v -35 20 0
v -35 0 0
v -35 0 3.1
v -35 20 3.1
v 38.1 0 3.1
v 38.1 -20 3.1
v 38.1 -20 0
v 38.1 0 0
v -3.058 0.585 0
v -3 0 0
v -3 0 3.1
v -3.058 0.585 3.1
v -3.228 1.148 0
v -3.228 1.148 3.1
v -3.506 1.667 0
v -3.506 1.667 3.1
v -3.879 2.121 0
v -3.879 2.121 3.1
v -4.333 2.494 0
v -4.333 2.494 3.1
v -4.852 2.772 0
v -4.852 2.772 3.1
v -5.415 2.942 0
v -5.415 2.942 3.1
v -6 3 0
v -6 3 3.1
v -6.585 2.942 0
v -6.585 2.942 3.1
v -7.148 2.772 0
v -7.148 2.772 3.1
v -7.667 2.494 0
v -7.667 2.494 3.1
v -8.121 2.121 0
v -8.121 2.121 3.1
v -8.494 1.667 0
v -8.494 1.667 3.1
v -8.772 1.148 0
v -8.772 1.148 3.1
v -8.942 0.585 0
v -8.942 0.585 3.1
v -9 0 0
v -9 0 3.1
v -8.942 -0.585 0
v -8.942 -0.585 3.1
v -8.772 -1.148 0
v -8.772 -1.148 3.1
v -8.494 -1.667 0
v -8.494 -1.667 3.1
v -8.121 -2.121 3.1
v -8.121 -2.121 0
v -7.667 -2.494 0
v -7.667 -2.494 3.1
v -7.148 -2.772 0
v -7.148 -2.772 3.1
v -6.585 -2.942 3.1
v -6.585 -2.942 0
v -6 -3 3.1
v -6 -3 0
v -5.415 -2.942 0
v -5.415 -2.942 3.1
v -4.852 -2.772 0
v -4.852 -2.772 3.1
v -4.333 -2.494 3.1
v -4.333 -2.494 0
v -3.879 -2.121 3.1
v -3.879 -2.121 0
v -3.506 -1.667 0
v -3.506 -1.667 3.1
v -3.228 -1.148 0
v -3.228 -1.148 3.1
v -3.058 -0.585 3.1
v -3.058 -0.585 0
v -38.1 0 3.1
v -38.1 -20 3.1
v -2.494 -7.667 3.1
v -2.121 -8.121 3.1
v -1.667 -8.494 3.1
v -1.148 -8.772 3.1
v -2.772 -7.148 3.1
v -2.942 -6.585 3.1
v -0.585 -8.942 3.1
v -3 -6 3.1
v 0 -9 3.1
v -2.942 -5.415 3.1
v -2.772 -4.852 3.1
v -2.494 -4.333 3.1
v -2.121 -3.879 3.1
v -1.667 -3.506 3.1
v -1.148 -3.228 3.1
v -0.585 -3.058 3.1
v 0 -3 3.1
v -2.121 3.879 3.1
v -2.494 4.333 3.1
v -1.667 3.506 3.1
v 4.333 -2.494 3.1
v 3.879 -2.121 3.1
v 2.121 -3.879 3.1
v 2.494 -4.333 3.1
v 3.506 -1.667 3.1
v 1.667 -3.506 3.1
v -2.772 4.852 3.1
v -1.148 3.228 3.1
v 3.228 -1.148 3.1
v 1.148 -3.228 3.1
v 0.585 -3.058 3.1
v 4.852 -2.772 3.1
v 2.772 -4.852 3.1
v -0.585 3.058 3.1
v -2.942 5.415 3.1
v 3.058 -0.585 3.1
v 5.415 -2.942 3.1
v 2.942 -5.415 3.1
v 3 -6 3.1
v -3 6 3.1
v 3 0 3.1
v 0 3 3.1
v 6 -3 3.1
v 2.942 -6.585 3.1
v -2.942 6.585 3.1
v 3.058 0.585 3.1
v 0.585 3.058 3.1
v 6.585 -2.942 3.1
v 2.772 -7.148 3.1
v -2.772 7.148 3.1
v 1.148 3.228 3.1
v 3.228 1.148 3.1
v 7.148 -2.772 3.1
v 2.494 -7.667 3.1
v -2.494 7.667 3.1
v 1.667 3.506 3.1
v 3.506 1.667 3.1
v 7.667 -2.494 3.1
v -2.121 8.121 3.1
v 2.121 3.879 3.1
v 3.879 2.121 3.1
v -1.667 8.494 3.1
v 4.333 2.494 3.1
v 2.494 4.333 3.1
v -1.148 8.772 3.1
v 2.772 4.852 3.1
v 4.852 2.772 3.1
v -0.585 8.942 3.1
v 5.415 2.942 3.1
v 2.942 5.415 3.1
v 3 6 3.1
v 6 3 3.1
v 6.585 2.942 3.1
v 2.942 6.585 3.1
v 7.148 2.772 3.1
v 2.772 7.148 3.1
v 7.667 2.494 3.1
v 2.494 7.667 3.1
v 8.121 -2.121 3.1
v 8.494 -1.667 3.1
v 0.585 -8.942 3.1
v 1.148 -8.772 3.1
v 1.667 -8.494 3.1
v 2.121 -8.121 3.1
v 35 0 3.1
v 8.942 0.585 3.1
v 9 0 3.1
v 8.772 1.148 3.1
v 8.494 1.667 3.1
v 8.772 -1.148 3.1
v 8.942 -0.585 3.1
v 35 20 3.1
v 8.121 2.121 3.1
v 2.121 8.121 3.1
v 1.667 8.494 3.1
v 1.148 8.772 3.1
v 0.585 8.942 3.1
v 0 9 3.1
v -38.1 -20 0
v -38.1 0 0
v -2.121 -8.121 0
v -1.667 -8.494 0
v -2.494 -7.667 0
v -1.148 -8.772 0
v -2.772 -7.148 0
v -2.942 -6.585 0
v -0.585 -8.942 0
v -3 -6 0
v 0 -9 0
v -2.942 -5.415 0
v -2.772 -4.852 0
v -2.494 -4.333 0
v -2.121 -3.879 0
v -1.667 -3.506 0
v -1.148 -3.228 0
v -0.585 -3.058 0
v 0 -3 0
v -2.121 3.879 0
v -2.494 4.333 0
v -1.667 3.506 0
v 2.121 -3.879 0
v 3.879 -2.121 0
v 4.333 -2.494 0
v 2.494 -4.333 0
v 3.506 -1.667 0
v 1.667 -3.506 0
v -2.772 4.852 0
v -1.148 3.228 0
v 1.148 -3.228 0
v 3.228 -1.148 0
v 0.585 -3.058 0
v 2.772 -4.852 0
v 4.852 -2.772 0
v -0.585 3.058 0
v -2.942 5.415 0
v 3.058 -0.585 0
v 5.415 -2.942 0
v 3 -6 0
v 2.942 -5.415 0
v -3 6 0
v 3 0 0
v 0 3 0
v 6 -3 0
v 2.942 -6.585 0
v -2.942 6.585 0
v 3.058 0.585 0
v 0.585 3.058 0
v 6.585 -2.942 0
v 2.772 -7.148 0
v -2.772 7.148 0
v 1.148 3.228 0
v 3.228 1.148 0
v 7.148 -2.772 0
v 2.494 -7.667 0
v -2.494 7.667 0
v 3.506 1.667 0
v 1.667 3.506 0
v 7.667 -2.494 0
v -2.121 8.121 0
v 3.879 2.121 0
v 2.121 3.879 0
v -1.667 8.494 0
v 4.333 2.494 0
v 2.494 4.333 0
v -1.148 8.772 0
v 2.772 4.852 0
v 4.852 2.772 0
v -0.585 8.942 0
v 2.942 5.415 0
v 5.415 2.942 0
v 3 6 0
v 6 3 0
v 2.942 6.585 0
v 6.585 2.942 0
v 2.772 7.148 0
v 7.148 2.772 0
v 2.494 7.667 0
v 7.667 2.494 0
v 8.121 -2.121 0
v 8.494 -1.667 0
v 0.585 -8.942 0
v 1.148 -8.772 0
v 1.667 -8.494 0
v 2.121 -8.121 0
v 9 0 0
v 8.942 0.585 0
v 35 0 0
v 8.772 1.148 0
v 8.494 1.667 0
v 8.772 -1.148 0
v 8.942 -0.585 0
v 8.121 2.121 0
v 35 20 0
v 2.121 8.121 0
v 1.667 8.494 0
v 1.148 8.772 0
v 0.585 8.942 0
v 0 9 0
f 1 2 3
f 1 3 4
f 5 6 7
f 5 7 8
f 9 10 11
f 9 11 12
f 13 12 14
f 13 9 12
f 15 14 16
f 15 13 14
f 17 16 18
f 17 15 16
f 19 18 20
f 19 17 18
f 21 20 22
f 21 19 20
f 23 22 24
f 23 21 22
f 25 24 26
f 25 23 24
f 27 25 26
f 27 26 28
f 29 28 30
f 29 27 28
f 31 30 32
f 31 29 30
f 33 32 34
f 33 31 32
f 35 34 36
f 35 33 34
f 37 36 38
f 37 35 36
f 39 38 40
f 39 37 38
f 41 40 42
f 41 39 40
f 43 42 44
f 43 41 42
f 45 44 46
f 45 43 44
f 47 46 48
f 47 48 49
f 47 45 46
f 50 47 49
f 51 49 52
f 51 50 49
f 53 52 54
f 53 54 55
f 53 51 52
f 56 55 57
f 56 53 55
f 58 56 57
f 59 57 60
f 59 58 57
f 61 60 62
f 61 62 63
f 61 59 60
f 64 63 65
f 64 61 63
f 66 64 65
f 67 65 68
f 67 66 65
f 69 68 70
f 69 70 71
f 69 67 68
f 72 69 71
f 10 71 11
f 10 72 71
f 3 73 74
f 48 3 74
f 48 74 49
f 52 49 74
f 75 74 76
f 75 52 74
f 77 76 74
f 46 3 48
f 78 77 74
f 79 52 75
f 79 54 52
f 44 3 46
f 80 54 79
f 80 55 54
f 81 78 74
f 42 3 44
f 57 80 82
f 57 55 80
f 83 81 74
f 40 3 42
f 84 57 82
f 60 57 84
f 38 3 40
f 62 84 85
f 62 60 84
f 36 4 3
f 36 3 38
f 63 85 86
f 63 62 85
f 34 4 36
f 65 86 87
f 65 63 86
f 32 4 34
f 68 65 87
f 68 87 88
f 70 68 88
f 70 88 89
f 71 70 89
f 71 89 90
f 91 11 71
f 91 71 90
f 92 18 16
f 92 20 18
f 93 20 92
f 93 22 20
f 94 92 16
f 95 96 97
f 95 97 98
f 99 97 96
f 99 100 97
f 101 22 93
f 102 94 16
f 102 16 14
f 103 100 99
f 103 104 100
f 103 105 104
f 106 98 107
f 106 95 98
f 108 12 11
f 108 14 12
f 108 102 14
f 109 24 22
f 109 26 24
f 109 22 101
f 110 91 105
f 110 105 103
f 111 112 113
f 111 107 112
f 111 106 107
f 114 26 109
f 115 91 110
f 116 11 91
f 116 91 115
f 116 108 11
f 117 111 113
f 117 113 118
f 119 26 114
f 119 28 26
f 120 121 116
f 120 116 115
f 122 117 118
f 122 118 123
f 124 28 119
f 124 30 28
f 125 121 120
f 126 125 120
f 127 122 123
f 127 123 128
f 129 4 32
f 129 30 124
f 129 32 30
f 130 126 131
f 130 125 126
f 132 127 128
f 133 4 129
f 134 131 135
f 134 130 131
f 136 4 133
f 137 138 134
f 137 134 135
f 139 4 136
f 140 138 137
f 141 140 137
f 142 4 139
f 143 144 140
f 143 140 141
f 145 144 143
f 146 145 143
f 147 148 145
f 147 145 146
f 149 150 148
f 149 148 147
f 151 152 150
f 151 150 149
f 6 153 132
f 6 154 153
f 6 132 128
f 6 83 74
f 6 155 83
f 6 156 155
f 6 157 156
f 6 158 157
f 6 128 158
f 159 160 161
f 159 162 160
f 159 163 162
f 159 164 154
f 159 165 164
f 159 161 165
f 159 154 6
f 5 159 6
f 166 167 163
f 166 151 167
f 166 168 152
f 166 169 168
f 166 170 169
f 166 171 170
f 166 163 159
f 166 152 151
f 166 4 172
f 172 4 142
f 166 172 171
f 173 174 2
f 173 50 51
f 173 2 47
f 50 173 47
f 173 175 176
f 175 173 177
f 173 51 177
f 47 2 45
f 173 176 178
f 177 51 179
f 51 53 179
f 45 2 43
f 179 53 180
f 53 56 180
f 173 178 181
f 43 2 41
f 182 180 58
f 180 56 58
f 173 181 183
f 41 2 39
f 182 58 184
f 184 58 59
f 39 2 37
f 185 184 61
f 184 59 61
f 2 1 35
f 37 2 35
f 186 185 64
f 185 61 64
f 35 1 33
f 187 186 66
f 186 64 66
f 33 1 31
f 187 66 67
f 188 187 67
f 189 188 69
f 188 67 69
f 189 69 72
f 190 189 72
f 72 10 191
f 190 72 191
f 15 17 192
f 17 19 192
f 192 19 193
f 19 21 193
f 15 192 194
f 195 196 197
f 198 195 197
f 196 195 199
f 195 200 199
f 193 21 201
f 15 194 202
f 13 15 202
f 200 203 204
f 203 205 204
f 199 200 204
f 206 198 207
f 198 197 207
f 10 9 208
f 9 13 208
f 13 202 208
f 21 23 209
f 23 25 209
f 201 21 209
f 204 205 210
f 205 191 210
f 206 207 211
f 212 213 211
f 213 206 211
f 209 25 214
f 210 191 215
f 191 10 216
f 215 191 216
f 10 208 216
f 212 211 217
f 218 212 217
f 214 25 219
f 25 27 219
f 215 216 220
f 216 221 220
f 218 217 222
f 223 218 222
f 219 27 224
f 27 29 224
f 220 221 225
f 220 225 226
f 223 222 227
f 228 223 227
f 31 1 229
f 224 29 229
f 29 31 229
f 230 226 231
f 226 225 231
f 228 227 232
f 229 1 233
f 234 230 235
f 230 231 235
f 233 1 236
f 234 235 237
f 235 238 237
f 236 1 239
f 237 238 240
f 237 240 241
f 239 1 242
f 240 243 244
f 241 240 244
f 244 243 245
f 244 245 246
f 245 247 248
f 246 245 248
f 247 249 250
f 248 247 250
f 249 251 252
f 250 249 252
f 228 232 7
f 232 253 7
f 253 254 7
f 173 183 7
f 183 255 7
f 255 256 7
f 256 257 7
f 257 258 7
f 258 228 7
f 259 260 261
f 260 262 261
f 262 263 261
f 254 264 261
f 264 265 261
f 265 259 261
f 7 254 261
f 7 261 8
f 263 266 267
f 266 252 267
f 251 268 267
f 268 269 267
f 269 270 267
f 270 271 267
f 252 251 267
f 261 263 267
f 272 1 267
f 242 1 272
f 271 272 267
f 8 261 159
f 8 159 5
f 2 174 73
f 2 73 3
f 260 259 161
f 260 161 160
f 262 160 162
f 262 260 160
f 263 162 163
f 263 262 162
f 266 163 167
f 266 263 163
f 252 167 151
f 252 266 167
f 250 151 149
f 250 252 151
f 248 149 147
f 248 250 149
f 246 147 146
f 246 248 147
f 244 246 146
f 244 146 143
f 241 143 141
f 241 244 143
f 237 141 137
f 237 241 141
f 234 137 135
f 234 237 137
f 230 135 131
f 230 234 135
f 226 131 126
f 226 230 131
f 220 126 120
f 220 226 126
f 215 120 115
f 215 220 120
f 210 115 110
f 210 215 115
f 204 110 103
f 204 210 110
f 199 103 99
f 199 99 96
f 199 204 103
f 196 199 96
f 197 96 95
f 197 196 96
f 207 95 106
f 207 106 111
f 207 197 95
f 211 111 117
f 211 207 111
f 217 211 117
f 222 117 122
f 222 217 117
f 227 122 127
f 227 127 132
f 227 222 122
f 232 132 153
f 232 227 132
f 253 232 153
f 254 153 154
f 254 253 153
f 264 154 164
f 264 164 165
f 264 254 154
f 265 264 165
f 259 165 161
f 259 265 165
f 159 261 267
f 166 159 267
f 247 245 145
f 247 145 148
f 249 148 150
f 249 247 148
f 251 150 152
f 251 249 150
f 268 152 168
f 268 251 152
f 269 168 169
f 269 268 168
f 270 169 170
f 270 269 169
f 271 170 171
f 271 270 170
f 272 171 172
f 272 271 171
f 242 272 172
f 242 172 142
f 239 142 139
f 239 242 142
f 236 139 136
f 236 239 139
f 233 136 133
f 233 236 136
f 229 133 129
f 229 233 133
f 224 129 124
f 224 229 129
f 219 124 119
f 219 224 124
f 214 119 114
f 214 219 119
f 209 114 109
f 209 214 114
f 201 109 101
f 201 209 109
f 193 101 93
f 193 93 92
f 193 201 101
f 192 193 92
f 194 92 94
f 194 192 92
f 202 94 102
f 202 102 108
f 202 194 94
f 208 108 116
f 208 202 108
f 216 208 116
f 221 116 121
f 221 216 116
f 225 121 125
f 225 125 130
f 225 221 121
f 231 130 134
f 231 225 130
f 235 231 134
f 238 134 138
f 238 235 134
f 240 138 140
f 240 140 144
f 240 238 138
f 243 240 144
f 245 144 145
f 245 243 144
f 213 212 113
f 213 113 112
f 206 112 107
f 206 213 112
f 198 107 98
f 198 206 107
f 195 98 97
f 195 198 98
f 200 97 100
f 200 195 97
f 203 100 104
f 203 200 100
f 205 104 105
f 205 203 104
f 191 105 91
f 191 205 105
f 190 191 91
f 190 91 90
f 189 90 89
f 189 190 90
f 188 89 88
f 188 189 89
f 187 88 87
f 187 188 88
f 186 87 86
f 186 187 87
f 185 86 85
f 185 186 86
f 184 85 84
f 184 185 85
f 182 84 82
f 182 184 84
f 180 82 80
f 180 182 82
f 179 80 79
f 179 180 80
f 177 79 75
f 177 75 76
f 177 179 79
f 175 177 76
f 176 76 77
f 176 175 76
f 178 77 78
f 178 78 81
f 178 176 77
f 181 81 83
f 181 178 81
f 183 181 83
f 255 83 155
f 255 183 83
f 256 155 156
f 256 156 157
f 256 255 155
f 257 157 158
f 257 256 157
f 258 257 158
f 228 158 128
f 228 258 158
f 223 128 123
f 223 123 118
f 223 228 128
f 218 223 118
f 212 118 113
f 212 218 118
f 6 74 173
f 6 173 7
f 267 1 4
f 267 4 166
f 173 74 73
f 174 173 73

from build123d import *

# Parameters (mm, degrees)
SKETCH1_W           = 70
SKETCH1_H           = 40
SKETCH1_R           = 3
BOSS_EXTRUDE1_DEPTH = 3.1
SKETCH2_W           = 3.1
SKETCH2_H           = 20
BOSS_EXTRUDE2_DEPTH = 3.1


with BuildPart() as part:
    # Sketch1 → Boss-Extrude1 (new body)
    with BuildSketch(Plane.XY):
        Rectangle(SKETCH1_W, SKETCH1_H)
        with Locations((-6, 0)):
            Circle(SKETCH1_R, mode=Mode.SUBTRACT)
        with Locations((0, 6)):
            Circle(SKETCH1_R, mode=Mode.SUBTRACT)
        with Locations((6, 0)):
            Circle(SKETCH1_R, mode=Mode.SUBTRACT)
        with Locations((0, -6)):
            Circle(SKETCH1_R, mode=Mode.SUBTRACT)
    extrude(amount=BOSS_EXTRUDE1_DEPTH)

    # Sketch2 → Boss-Extrude2 (add, through all)
    with BuildSketch(Plane.XY.offset(3.1)):
        with Locations((36.55, -10)):
            Rectangle(SKETCH2_W, SKETCH2_H)
        with Locations((-36.55, -10)):
            Rectangle(SKETCH2_W, SKETCH2_H)
    extrude(amount=-BOSS_EXTRUDE2_DEPTH)


solid = part.part
